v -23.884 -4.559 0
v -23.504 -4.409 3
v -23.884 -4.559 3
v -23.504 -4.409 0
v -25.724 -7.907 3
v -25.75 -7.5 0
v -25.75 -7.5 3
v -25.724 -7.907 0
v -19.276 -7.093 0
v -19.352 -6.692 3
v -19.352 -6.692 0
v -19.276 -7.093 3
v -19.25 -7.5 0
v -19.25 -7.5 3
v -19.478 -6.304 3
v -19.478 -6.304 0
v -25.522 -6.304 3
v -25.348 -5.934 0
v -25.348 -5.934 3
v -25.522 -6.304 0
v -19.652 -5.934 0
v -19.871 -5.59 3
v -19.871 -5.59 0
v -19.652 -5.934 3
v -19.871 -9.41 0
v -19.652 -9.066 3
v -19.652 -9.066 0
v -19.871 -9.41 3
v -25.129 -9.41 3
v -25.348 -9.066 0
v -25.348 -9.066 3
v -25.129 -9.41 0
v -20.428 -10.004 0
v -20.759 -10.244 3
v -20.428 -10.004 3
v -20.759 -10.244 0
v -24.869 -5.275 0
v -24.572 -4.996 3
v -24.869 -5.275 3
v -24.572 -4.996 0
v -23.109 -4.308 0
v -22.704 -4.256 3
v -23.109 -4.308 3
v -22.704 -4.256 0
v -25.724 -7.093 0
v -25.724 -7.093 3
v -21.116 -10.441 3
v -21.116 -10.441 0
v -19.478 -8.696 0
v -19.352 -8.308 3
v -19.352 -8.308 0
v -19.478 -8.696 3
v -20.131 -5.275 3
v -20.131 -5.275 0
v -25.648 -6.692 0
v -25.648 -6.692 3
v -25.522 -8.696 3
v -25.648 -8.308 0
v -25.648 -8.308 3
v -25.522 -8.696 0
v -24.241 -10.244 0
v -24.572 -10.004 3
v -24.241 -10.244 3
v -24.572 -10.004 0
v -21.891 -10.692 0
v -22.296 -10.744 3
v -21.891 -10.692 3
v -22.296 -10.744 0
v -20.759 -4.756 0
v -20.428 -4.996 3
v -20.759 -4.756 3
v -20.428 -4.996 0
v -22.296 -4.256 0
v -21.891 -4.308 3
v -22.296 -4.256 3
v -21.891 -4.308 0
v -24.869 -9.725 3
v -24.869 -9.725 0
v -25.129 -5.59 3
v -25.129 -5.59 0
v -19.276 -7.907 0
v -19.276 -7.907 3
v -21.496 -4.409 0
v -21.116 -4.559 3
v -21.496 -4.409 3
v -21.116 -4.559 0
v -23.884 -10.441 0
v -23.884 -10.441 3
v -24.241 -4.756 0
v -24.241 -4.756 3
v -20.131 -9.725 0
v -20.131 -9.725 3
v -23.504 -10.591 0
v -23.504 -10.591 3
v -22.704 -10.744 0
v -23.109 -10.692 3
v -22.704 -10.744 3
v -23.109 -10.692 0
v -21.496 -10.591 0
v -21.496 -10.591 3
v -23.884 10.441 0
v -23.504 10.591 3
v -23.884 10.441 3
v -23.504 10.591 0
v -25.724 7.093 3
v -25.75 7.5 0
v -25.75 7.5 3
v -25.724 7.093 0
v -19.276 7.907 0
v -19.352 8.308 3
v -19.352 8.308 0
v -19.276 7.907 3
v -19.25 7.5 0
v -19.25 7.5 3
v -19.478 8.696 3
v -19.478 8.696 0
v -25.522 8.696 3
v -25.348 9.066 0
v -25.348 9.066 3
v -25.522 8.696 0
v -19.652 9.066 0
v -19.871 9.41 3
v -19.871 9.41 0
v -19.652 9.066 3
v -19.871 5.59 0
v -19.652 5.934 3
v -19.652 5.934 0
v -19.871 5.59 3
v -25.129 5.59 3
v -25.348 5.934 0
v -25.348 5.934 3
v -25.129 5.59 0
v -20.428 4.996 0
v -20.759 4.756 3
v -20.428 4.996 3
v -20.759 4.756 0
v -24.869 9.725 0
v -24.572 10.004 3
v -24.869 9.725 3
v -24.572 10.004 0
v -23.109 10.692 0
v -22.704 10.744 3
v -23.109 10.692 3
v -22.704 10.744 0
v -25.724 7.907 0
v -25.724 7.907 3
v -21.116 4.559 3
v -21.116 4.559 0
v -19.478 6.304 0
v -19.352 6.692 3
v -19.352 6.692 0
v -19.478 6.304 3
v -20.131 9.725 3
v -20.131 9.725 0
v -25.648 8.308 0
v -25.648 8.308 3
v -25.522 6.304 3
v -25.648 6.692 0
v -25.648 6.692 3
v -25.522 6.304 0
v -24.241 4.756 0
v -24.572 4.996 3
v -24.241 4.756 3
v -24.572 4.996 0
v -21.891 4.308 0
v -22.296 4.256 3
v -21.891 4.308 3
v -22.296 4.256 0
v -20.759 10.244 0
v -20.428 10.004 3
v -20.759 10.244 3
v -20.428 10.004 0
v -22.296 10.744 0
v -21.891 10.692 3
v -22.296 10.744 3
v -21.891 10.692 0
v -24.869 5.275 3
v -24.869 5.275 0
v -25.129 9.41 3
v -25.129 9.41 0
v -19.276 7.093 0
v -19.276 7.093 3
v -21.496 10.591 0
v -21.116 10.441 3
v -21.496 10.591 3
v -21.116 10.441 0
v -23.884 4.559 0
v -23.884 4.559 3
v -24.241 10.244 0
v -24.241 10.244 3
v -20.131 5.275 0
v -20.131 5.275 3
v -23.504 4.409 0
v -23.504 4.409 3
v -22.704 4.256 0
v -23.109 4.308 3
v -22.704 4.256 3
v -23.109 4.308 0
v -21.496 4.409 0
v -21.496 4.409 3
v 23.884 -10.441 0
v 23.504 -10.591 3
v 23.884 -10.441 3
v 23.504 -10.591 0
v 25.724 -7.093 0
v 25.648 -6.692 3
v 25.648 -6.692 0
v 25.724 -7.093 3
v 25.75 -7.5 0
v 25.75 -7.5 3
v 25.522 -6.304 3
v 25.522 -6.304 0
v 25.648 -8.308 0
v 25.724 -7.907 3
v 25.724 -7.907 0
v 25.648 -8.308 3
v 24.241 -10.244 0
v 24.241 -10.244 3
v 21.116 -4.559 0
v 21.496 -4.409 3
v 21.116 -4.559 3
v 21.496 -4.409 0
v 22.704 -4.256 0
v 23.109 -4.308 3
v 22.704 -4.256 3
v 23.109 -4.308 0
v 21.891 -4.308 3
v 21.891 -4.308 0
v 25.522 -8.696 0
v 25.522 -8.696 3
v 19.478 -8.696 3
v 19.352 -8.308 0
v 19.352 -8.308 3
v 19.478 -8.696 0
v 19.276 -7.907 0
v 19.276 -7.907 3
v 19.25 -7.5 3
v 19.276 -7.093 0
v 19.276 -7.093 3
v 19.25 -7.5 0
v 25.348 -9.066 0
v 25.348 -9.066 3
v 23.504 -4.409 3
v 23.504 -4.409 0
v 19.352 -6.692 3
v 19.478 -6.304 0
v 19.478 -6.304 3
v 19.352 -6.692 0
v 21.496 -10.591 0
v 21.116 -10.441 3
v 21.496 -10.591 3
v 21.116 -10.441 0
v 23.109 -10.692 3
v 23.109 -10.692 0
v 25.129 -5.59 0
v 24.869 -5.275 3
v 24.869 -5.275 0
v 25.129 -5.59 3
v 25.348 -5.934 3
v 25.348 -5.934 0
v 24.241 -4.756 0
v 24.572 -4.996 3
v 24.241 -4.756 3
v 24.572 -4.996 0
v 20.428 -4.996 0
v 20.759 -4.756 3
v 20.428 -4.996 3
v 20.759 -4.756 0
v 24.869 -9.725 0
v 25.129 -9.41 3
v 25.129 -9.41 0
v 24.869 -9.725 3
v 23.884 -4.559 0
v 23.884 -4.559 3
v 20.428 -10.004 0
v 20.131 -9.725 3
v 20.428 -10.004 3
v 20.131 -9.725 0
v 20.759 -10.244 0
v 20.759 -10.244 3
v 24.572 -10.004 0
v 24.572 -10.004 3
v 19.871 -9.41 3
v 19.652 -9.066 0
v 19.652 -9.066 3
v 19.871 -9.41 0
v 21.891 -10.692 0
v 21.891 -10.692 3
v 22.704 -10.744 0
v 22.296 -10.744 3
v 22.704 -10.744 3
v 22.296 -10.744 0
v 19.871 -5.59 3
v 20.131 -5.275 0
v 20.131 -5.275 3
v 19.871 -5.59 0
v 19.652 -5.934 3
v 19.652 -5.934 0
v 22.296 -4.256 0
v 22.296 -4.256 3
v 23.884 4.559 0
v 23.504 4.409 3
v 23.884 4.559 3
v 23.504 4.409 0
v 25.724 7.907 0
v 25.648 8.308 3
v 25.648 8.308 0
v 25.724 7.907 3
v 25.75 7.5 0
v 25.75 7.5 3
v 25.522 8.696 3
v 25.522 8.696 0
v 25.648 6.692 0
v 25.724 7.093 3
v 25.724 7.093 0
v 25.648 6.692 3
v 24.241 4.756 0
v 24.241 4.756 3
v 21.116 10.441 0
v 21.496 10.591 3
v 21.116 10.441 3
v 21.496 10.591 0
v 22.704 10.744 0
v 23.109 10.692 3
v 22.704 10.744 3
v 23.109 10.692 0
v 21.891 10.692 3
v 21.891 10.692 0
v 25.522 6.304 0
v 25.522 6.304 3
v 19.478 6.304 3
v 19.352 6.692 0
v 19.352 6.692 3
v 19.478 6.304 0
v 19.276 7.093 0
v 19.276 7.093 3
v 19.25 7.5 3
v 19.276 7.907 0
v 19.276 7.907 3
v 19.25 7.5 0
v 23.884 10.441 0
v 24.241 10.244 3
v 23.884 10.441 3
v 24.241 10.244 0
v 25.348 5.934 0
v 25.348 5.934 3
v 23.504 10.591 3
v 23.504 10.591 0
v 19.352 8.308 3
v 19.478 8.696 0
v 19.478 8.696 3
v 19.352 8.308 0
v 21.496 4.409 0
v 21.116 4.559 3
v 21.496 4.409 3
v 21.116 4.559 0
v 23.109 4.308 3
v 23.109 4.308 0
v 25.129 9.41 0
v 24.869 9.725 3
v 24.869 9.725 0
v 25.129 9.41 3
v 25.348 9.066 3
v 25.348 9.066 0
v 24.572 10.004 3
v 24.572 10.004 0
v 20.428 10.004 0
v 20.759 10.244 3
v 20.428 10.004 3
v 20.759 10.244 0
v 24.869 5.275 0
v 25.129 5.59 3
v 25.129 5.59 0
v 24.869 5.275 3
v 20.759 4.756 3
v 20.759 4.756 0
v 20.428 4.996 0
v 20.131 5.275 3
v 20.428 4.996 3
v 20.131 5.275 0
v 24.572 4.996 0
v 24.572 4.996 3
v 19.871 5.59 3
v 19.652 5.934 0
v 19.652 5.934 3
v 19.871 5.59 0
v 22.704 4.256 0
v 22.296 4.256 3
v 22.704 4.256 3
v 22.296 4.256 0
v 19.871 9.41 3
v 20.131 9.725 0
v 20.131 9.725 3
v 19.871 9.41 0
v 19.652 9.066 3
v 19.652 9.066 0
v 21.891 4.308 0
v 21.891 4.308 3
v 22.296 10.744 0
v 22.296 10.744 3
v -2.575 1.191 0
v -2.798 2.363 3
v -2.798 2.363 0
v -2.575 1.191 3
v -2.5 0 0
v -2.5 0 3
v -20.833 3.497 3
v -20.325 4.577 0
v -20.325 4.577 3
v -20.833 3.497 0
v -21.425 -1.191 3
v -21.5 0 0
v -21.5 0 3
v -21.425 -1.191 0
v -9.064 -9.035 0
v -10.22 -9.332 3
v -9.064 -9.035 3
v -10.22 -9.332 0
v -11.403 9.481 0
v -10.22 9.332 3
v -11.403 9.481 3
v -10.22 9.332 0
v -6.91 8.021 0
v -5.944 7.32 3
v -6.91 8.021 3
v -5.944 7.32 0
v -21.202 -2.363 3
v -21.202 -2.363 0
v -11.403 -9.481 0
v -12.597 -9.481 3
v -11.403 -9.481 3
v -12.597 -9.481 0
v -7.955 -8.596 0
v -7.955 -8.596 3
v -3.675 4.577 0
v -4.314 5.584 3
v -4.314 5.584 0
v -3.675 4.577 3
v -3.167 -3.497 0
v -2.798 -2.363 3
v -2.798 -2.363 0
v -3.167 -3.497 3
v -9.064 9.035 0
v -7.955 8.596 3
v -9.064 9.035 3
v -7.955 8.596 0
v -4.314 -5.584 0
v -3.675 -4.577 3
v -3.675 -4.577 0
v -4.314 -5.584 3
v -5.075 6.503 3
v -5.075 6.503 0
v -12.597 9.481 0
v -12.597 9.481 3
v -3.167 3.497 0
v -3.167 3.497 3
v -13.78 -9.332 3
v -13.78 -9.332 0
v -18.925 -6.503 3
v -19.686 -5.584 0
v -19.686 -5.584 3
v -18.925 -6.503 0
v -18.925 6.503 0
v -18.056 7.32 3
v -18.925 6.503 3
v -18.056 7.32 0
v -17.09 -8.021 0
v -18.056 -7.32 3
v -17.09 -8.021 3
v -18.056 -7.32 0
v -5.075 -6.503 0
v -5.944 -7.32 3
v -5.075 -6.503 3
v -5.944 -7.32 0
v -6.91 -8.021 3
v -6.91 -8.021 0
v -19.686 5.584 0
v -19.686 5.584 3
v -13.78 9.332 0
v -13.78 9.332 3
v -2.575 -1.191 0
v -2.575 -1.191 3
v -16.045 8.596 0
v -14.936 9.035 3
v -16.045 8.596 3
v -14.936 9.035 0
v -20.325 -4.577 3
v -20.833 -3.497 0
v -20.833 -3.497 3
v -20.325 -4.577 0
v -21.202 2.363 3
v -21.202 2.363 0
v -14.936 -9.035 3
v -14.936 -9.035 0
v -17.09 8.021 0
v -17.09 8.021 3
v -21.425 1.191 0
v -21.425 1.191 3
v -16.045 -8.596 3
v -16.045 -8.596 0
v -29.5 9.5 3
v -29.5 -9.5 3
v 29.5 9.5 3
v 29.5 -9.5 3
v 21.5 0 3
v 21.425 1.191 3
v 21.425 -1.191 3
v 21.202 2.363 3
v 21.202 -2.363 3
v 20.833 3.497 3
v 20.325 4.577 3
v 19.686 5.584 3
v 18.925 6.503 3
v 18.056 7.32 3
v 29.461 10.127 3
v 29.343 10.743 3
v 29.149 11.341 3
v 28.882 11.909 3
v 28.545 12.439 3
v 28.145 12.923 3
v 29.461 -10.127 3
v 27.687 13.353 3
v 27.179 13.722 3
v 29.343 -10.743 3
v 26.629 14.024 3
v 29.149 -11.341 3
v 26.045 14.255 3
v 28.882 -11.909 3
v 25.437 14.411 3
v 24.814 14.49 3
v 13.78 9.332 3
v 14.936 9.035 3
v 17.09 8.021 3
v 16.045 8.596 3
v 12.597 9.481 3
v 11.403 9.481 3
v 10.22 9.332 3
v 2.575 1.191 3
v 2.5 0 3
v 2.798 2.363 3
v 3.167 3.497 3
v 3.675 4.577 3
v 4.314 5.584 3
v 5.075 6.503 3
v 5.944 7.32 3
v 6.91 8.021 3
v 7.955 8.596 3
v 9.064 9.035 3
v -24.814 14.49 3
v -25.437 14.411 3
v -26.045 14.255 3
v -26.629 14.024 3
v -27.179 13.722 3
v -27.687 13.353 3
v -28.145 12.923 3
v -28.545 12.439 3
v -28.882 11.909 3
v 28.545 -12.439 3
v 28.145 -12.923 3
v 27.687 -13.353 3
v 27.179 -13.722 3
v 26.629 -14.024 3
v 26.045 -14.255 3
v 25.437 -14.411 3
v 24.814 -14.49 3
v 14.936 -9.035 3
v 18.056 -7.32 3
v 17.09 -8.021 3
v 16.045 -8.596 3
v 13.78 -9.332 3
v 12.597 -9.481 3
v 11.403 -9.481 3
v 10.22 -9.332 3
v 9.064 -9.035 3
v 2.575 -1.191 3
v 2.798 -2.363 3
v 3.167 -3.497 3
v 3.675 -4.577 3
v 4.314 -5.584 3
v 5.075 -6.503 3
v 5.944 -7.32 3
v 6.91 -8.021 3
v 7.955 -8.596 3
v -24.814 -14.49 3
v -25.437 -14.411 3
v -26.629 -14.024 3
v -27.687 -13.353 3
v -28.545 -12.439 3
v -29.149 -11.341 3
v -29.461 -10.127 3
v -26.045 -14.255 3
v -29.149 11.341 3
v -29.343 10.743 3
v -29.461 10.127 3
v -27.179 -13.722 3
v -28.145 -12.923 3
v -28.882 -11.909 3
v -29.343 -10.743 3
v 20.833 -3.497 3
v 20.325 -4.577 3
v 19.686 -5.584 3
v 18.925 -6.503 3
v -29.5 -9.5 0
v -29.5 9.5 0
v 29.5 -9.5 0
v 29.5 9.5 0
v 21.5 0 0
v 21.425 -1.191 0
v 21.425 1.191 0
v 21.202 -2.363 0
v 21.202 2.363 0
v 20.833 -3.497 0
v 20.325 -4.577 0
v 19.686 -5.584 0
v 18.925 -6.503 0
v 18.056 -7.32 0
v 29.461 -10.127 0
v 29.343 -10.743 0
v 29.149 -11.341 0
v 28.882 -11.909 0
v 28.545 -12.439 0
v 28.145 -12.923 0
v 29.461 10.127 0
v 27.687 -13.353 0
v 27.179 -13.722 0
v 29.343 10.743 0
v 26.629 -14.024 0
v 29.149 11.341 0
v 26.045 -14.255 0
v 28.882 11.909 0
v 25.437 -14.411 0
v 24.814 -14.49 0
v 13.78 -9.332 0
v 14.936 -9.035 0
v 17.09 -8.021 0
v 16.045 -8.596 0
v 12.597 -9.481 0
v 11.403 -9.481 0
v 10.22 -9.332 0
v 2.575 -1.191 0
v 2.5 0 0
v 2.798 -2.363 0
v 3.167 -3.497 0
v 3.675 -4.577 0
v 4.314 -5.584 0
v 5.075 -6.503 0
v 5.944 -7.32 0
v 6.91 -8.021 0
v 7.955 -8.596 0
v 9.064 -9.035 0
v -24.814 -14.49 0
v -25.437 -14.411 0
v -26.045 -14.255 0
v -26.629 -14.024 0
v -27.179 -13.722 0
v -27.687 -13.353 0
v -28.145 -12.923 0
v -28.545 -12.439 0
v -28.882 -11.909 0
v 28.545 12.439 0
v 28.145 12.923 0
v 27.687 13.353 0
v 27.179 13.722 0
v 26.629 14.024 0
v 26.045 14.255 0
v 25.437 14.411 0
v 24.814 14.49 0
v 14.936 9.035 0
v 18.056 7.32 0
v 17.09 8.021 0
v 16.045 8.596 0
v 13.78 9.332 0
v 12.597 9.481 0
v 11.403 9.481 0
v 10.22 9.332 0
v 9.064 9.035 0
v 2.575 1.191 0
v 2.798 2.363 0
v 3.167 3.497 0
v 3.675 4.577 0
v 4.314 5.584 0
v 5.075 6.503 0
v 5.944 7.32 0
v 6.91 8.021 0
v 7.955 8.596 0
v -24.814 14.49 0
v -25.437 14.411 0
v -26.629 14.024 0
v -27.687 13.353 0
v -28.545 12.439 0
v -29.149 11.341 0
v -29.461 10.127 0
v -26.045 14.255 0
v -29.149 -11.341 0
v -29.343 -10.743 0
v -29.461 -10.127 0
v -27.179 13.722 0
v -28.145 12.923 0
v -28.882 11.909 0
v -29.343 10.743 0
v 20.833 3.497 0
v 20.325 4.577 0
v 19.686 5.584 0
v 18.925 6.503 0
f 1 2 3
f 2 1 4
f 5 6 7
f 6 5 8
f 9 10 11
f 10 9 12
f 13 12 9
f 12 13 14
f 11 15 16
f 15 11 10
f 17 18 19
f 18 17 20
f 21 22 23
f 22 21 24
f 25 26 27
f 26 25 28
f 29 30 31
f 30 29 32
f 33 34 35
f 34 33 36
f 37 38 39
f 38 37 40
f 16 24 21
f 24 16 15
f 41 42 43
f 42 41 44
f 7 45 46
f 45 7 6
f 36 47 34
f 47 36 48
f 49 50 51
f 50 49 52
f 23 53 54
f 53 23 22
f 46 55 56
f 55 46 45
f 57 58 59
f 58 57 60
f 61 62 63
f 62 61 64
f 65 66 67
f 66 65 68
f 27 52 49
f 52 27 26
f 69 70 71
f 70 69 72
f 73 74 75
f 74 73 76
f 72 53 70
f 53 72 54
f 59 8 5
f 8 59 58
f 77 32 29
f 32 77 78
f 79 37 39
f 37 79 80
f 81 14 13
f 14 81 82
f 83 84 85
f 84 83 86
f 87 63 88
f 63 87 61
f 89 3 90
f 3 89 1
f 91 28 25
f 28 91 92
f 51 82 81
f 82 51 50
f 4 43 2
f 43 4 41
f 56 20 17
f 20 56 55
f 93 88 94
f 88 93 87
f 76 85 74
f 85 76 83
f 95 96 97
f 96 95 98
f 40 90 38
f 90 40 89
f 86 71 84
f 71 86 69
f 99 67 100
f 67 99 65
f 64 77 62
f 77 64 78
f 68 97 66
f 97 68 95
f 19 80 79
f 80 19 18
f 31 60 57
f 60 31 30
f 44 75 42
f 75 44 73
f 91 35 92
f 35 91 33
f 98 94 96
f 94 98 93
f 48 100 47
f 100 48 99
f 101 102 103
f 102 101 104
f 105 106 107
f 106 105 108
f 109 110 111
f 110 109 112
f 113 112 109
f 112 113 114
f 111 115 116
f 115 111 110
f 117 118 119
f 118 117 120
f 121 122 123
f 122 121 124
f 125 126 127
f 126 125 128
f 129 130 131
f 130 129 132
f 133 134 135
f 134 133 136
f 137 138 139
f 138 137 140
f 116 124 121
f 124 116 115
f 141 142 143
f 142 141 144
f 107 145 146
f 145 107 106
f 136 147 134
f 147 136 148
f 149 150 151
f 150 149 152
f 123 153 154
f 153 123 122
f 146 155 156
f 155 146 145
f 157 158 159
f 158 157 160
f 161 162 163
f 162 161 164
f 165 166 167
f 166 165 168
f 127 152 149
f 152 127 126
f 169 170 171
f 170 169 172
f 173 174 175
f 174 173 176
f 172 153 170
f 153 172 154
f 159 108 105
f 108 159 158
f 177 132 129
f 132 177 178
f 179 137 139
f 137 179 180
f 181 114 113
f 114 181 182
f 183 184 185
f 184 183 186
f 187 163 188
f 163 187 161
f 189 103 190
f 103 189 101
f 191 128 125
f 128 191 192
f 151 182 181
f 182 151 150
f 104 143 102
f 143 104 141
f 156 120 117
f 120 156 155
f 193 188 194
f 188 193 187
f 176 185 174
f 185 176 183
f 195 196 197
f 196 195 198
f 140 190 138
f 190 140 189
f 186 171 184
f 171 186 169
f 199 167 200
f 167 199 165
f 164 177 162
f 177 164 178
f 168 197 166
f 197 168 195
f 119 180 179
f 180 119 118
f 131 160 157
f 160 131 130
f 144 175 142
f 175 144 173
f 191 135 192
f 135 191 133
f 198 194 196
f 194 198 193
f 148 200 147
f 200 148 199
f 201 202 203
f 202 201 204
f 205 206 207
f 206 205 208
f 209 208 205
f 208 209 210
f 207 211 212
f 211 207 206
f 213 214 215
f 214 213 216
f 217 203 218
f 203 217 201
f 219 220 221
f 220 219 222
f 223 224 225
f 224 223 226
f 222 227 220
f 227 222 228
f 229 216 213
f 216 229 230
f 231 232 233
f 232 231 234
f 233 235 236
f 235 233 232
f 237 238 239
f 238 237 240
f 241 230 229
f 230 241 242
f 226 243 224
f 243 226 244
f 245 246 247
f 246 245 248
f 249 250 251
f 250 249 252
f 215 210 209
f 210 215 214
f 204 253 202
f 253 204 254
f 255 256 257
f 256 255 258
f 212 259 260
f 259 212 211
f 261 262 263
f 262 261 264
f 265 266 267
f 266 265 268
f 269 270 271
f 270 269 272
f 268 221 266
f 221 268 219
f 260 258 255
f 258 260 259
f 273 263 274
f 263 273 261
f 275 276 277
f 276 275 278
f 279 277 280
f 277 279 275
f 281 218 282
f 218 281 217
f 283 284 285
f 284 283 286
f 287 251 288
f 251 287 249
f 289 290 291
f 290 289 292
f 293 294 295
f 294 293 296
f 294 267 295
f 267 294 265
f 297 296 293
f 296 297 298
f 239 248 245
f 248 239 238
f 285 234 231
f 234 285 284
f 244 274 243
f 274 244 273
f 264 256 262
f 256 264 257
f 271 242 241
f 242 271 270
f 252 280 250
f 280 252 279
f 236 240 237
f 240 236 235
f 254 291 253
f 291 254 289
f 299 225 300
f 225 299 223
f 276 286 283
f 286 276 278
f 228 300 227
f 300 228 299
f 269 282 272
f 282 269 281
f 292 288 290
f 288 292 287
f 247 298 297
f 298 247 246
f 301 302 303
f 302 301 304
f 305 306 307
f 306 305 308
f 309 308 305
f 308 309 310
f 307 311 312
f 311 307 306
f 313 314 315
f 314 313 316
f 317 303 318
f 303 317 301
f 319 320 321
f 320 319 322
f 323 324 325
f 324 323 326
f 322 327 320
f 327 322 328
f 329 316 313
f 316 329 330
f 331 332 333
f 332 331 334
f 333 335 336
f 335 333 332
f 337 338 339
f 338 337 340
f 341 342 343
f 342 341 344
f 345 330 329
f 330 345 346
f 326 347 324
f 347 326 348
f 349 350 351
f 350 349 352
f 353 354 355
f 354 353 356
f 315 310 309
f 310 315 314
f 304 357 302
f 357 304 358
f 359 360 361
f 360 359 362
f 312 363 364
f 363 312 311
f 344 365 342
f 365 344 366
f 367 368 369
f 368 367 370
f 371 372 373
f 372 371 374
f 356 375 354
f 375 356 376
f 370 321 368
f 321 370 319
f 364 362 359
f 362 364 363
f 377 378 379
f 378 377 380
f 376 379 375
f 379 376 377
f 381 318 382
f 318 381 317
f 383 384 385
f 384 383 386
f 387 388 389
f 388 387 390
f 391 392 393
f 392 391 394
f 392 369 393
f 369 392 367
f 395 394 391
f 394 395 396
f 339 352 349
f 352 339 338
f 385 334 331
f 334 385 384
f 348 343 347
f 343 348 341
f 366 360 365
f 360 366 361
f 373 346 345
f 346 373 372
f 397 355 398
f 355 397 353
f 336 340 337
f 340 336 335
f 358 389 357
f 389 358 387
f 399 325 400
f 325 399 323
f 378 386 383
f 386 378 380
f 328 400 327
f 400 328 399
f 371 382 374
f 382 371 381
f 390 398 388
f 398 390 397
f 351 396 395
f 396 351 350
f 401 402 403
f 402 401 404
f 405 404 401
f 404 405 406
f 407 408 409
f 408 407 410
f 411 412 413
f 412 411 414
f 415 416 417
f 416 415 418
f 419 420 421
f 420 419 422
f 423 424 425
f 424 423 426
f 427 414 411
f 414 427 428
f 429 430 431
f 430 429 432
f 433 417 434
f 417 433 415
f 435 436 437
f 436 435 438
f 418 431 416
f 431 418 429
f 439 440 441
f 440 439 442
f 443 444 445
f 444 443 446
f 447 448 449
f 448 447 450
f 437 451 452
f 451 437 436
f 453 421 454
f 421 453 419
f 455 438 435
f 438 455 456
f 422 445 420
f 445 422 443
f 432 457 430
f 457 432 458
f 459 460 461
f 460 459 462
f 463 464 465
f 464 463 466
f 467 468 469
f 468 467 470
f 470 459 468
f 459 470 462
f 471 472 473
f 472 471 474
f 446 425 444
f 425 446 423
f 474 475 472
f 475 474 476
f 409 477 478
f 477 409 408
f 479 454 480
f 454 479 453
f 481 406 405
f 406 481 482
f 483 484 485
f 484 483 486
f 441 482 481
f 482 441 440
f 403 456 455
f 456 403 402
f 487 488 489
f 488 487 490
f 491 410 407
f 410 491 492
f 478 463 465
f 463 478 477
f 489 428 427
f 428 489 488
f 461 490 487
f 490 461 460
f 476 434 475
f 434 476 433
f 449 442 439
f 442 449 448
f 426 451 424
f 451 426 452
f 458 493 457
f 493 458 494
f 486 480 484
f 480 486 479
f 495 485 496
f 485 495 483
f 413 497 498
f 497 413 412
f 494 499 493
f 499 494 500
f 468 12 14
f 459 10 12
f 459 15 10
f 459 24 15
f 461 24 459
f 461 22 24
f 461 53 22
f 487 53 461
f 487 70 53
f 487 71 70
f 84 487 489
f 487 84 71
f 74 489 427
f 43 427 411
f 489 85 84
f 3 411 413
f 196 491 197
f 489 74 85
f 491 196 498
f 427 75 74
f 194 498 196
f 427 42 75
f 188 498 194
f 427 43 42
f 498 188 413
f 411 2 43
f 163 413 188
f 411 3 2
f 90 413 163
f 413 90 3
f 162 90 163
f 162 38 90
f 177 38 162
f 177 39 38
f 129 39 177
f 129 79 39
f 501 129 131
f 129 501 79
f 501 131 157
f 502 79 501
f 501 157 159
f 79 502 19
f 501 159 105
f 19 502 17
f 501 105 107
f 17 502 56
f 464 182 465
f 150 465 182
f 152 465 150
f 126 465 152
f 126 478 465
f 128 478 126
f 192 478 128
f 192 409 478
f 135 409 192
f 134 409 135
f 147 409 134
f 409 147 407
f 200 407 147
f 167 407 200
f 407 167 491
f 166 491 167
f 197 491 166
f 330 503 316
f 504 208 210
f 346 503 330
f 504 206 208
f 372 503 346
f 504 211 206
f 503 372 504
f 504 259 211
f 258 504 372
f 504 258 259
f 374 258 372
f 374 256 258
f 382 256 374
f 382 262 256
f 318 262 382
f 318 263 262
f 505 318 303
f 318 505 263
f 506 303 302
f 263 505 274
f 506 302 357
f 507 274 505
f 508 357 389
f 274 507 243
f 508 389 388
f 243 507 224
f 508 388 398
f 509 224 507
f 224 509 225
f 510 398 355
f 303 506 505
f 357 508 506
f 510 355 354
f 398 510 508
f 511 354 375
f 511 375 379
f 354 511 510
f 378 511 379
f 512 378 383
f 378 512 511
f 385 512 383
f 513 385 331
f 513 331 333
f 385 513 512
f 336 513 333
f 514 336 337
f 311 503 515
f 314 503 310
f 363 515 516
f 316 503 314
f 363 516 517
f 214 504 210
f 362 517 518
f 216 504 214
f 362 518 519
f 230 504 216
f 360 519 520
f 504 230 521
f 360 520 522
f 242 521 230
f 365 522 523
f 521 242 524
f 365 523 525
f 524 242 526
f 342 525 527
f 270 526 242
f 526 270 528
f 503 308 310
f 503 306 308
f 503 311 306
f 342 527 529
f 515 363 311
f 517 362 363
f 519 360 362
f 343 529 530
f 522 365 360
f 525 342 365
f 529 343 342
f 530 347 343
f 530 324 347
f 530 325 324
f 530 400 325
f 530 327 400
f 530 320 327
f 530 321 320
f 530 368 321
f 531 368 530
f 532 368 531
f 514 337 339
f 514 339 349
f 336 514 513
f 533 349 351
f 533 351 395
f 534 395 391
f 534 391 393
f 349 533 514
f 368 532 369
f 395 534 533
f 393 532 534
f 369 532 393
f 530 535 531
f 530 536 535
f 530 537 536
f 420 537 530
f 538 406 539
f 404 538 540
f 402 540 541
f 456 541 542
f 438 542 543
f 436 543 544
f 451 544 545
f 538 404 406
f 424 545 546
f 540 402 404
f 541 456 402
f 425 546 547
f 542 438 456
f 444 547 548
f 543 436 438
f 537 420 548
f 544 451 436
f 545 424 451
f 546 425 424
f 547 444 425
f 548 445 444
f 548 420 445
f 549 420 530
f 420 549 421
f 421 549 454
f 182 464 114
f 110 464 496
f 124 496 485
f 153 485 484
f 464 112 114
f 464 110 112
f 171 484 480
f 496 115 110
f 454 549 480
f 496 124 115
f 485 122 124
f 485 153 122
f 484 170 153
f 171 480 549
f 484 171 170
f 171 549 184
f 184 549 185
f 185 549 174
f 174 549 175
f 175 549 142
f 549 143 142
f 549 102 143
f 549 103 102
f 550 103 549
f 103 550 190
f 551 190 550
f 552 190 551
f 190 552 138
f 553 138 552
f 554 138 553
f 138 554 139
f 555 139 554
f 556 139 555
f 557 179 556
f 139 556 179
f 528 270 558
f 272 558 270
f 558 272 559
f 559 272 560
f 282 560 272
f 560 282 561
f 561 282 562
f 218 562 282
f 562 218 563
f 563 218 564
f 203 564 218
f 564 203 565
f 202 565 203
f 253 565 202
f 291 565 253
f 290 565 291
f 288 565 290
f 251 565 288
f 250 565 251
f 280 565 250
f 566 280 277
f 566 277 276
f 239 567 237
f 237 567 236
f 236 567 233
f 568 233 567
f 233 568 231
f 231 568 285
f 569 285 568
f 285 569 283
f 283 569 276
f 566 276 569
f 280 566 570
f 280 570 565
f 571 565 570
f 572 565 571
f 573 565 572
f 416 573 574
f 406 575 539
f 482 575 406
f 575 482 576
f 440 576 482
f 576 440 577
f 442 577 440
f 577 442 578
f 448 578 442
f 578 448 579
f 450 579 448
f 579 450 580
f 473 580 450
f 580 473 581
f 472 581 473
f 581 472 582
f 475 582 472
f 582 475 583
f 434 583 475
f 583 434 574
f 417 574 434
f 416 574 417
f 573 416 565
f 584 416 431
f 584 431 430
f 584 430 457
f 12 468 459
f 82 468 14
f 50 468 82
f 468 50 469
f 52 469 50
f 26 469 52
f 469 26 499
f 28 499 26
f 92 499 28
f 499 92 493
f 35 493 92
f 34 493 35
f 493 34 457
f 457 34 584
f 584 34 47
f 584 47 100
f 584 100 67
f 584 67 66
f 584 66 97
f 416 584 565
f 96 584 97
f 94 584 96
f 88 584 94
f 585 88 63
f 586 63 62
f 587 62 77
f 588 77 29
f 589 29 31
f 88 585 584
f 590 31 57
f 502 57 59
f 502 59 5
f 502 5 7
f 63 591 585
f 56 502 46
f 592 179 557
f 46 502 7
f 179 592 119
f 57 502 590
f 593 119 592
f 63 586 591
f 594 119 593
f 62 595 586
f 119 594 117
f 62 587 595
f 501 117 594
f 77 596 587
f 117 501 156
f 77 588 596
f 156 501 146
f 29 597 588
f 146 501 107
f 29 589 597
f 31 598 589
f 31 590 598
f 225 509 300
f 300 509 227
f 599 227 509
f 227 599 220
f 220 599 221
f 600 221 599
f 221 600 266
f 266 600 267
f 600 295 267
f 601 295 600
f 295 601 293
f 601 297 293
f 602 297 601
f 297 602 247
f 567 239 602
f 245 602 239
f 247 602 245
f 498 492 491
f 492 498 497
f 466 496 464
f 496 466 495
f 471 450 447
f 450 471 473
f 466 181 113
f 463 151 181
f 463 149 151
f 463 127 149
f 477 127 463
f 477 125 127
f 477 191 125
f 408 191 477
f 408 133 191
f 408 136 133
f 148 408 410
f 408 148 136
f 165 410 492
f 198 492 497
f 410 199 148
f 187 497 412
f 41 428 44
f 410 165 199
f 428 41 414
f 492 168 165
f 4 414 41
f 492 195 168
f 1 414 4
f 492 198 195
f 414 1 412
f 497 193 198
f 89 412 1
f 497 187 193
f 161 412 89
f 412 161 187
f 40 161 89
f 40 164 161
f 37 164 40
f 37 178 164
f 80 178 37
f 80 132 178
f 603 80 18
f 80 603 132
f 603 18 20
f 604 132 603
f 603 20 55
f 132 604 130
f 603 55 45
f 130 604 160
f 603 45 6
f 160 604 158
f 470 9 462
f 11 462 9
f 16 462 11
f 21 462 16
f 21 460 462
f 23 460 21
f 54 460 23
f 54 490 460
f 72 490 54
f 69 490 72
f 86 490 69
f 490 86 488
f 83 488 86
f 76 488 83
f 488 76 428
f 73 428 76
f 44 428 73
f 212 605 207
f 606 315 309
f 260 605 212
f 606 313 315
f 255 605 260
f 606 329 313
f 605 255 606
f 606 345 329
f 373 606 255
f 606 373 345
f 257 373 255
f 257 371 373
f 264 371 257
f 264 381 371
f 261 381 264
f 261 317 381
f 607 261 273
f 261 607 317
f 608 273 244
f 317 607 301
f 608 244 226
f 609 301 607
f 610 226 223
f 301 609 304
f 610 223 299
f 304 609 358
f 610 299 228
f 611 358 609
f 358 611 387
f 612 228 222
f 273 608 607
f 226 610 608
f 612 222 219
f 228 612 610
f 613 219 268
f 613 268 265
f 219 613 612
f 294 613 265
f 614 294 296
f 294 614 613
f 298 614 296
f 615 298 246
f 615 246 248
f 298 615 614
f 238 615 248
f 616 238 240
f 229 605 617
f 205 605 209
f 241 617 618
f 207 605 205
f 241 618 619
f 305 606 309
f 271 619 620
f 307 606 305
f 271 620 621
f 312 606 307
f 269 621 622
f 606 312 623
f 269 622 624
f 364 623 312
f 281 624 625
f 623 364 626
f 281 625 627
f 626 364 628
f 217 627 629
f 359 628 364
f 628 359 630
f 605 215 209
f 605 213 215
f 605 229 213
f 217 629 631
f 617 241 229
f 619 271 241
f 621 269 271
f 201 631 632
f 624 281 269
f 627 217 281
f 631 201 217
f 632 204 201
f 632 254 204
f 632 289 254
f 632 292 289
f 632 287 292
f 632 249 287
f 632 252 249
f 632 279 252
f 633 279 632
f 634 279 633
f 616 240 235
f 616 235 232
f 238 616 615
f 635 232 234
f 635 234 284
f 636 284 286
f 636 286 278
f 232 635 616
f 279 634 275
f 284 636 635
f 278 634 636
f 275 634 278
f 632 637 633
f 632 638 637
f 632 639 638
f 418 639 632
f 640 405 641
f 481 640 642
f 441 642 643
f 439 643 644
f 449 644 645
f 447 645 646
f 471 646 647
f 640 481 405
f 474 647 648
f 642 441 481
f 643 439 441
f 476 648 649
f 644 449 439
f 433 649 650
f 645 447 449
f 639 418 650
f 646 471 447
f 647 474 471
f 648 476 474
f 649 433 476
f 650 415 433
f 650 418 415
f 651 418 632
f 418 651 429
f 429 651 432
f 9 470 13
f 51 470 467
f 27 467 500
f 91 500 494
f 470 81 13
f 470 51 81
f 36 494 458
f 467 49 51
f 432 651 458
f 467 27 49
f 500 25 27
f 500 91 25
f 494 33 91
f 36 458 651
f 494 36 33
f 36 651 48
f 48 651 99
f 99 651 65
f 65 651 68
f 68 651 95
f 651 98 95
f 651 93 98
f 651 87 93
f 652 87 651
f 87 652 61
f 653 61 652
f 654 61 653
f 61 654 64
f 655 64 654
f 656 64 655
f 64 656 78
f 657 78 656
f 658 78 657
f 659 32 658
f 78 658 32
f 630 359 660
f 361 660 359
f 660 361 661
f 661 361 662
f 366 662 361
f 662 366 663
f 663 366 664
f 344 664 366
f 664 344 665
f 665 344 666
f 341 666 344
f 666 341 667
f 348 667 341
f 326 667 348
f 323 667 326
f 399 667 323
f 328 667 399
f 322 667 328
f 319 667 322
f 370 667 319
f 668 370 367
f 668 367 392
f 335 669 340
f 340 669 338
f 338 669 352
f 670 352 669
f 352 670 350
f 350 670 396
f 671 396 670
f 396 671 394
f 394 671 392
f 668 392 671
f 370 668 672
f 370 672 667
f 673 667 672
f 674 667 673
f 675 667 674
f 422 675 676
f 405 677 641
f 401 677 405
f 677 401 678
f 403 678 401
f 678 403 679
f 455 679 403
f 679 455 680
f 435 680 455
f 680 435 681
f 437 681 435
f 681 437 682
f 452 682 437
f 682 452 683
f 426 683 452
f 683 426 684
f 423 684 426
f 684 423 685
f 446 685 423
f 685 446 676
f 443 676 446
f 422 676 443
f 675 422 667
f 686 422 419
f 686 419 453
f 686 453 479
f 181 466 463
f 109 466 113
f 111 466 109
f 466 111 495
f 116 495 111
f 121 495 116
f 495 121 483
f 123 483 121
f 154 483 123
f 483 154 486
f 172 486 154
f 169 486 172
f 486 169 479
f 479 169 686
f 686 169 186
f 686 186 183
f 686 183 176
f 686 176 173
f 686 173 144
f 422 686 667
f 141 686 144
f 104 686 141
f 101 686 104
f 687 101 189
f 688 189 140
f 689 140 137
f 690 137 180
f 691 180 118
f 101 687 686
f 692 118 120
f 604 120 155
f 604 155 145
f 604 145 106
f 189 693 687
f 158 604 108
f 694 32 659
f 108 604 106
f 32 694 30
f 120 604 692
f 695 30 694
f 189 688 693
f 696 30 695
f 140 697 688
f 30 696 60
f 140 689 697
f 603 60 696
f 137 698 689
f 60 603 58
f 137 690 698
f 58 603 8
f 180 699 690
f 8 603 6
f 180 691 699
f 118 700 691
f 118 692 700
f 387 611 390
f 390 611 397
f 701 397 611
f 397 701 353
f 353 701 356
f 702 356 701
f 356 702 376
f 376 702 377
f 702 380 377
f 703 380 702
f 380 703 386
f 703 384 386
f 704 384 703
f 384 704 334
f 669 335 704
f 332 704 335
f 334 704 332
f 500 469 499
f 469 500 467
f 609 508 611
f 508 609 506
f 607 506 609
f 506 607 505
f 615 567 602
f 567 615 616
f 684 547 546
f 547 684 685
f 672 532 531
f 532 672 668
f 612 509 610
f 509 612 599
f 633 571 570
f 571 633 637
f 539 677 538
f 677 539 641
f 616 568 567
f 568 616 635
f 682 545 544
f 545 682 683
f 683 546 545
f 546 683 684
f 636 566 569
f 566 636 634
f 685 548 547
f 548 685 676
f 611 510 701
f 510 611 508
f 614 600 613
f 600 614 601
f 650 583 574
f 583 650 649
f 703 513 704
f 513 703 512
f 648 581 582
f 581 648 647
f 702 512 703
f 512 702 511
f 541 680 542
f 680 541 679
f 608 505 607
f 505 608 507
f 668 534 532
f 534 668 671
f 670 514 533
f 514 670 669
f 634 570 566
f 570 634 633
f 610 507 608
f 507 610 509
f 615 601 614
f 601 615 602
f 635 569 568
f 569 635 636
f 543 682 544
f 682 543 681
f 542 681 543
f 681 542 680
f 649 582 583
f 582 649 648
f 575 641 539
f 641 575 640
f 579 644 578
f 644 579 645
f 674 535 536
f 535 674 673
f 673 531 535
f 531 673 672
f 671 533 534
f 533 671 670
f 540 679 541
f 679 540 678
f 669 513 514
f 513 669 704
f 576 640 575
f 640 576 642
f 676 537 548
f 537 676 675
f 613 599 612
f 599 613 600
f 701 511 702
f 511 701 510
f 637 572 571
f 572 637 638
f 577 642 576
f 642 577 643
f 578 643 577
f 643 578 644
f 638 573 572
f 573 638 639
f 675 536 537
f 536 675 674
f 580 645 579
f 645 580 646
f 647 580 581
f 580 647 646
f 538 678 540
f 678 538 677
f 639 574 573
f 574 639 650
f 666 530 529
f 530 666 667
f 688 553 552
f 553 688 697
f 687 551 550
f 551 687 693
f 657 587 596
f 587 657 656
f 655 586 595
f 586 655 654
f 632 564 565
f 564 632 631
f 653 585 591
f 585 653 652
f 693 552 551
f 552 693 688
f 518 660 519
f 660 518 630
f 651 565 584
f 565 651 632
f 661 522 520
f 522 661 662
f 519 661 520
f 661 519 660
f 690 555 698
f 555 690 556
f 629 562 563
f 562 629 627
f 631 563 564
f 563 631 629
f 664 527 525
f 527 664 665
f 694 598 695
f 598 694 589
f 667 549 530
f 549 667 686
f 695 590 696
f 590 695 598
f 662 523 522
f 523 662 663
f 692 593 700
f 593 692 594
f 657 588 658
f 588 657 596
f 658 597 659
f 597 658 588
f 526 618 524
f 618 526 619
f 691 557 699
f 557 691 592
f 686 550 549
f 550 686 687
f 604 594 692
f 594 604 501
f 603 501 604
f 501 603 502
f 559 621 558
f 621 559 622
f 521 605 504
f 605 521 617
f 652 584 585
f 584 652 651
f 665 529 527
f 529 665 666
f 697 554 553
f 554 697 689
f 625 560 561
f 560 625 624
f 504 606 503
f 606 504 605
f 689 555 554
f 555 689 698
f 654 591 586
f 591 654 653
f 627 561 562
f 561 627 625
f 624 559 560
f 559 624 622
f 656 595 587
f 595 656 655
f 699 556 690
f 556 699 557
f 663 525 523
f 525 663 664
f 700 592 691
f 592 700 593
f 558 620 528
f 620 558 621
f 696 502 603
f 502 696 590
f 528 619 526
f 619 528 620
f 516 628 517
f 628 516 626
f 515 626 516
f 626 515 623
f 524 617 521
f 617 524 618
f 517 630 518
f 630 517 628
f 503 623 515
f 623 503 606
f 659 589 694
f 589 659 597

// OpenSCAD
$fn = 50;

difference() {
	union() {
		hull() {
			translate(v = [-24.5, 9.5, 0]) {
				cylinder(h = 3, r = 5);
			}
			translate(v = [24.5, 9.5, 0]) {
				cylinder(h = 3, r = 5);
			}
			translate(v = [-24.5, -9.5, 0]) {
				cylinder(h = 3, r = 5);
			}
			translate(v = [24.5, -9.5, 0]) {
				cylinder(h = 3, r = 5);
			}
		}
	}
	union() {
		translate(v = [-22.5, -7.5, -100.0]) {
			cylinder(h = 200, r = 3.25);
		}
		translate(v = [-22.5, 7.5, -100.0]) {
			cylinder(h = 200, r = 3.25);
		}
		translate(v = [22.5, -7.5, -100.0]) {
			cylinder(h = 200, r = 3.25);
		}
		translate(v = [22.5, 7.5, -100.0]) {
			cylinder(h = 200, r = 3.25);
		}
		translate(v = [-22.5, -7.5, -100.0]) {
			cylinder(h = 200, r = 1.8);
		}
		translate(v = [-22.5, 7.5, -100.0]) {
			cylinder(h = 200, r = 1.8);
		}
		translate(v = [22.5, -7.5, -100.0]) {
			cylinder(h = 200, r = 1.8);
		}
		translate(v = [22.5, 7.5, -100.0]) {
			cylinder(h = 200, r = 1.8);
		}
		translate(v = [-12.0, 0, 0.0]) {
			cylinder(h = 3, r = 9.5);
		}
		translate(v = [12.0, 0, 0.0]) {
			cylinder(h = 3, r = 9.5);
		}
	}
}
